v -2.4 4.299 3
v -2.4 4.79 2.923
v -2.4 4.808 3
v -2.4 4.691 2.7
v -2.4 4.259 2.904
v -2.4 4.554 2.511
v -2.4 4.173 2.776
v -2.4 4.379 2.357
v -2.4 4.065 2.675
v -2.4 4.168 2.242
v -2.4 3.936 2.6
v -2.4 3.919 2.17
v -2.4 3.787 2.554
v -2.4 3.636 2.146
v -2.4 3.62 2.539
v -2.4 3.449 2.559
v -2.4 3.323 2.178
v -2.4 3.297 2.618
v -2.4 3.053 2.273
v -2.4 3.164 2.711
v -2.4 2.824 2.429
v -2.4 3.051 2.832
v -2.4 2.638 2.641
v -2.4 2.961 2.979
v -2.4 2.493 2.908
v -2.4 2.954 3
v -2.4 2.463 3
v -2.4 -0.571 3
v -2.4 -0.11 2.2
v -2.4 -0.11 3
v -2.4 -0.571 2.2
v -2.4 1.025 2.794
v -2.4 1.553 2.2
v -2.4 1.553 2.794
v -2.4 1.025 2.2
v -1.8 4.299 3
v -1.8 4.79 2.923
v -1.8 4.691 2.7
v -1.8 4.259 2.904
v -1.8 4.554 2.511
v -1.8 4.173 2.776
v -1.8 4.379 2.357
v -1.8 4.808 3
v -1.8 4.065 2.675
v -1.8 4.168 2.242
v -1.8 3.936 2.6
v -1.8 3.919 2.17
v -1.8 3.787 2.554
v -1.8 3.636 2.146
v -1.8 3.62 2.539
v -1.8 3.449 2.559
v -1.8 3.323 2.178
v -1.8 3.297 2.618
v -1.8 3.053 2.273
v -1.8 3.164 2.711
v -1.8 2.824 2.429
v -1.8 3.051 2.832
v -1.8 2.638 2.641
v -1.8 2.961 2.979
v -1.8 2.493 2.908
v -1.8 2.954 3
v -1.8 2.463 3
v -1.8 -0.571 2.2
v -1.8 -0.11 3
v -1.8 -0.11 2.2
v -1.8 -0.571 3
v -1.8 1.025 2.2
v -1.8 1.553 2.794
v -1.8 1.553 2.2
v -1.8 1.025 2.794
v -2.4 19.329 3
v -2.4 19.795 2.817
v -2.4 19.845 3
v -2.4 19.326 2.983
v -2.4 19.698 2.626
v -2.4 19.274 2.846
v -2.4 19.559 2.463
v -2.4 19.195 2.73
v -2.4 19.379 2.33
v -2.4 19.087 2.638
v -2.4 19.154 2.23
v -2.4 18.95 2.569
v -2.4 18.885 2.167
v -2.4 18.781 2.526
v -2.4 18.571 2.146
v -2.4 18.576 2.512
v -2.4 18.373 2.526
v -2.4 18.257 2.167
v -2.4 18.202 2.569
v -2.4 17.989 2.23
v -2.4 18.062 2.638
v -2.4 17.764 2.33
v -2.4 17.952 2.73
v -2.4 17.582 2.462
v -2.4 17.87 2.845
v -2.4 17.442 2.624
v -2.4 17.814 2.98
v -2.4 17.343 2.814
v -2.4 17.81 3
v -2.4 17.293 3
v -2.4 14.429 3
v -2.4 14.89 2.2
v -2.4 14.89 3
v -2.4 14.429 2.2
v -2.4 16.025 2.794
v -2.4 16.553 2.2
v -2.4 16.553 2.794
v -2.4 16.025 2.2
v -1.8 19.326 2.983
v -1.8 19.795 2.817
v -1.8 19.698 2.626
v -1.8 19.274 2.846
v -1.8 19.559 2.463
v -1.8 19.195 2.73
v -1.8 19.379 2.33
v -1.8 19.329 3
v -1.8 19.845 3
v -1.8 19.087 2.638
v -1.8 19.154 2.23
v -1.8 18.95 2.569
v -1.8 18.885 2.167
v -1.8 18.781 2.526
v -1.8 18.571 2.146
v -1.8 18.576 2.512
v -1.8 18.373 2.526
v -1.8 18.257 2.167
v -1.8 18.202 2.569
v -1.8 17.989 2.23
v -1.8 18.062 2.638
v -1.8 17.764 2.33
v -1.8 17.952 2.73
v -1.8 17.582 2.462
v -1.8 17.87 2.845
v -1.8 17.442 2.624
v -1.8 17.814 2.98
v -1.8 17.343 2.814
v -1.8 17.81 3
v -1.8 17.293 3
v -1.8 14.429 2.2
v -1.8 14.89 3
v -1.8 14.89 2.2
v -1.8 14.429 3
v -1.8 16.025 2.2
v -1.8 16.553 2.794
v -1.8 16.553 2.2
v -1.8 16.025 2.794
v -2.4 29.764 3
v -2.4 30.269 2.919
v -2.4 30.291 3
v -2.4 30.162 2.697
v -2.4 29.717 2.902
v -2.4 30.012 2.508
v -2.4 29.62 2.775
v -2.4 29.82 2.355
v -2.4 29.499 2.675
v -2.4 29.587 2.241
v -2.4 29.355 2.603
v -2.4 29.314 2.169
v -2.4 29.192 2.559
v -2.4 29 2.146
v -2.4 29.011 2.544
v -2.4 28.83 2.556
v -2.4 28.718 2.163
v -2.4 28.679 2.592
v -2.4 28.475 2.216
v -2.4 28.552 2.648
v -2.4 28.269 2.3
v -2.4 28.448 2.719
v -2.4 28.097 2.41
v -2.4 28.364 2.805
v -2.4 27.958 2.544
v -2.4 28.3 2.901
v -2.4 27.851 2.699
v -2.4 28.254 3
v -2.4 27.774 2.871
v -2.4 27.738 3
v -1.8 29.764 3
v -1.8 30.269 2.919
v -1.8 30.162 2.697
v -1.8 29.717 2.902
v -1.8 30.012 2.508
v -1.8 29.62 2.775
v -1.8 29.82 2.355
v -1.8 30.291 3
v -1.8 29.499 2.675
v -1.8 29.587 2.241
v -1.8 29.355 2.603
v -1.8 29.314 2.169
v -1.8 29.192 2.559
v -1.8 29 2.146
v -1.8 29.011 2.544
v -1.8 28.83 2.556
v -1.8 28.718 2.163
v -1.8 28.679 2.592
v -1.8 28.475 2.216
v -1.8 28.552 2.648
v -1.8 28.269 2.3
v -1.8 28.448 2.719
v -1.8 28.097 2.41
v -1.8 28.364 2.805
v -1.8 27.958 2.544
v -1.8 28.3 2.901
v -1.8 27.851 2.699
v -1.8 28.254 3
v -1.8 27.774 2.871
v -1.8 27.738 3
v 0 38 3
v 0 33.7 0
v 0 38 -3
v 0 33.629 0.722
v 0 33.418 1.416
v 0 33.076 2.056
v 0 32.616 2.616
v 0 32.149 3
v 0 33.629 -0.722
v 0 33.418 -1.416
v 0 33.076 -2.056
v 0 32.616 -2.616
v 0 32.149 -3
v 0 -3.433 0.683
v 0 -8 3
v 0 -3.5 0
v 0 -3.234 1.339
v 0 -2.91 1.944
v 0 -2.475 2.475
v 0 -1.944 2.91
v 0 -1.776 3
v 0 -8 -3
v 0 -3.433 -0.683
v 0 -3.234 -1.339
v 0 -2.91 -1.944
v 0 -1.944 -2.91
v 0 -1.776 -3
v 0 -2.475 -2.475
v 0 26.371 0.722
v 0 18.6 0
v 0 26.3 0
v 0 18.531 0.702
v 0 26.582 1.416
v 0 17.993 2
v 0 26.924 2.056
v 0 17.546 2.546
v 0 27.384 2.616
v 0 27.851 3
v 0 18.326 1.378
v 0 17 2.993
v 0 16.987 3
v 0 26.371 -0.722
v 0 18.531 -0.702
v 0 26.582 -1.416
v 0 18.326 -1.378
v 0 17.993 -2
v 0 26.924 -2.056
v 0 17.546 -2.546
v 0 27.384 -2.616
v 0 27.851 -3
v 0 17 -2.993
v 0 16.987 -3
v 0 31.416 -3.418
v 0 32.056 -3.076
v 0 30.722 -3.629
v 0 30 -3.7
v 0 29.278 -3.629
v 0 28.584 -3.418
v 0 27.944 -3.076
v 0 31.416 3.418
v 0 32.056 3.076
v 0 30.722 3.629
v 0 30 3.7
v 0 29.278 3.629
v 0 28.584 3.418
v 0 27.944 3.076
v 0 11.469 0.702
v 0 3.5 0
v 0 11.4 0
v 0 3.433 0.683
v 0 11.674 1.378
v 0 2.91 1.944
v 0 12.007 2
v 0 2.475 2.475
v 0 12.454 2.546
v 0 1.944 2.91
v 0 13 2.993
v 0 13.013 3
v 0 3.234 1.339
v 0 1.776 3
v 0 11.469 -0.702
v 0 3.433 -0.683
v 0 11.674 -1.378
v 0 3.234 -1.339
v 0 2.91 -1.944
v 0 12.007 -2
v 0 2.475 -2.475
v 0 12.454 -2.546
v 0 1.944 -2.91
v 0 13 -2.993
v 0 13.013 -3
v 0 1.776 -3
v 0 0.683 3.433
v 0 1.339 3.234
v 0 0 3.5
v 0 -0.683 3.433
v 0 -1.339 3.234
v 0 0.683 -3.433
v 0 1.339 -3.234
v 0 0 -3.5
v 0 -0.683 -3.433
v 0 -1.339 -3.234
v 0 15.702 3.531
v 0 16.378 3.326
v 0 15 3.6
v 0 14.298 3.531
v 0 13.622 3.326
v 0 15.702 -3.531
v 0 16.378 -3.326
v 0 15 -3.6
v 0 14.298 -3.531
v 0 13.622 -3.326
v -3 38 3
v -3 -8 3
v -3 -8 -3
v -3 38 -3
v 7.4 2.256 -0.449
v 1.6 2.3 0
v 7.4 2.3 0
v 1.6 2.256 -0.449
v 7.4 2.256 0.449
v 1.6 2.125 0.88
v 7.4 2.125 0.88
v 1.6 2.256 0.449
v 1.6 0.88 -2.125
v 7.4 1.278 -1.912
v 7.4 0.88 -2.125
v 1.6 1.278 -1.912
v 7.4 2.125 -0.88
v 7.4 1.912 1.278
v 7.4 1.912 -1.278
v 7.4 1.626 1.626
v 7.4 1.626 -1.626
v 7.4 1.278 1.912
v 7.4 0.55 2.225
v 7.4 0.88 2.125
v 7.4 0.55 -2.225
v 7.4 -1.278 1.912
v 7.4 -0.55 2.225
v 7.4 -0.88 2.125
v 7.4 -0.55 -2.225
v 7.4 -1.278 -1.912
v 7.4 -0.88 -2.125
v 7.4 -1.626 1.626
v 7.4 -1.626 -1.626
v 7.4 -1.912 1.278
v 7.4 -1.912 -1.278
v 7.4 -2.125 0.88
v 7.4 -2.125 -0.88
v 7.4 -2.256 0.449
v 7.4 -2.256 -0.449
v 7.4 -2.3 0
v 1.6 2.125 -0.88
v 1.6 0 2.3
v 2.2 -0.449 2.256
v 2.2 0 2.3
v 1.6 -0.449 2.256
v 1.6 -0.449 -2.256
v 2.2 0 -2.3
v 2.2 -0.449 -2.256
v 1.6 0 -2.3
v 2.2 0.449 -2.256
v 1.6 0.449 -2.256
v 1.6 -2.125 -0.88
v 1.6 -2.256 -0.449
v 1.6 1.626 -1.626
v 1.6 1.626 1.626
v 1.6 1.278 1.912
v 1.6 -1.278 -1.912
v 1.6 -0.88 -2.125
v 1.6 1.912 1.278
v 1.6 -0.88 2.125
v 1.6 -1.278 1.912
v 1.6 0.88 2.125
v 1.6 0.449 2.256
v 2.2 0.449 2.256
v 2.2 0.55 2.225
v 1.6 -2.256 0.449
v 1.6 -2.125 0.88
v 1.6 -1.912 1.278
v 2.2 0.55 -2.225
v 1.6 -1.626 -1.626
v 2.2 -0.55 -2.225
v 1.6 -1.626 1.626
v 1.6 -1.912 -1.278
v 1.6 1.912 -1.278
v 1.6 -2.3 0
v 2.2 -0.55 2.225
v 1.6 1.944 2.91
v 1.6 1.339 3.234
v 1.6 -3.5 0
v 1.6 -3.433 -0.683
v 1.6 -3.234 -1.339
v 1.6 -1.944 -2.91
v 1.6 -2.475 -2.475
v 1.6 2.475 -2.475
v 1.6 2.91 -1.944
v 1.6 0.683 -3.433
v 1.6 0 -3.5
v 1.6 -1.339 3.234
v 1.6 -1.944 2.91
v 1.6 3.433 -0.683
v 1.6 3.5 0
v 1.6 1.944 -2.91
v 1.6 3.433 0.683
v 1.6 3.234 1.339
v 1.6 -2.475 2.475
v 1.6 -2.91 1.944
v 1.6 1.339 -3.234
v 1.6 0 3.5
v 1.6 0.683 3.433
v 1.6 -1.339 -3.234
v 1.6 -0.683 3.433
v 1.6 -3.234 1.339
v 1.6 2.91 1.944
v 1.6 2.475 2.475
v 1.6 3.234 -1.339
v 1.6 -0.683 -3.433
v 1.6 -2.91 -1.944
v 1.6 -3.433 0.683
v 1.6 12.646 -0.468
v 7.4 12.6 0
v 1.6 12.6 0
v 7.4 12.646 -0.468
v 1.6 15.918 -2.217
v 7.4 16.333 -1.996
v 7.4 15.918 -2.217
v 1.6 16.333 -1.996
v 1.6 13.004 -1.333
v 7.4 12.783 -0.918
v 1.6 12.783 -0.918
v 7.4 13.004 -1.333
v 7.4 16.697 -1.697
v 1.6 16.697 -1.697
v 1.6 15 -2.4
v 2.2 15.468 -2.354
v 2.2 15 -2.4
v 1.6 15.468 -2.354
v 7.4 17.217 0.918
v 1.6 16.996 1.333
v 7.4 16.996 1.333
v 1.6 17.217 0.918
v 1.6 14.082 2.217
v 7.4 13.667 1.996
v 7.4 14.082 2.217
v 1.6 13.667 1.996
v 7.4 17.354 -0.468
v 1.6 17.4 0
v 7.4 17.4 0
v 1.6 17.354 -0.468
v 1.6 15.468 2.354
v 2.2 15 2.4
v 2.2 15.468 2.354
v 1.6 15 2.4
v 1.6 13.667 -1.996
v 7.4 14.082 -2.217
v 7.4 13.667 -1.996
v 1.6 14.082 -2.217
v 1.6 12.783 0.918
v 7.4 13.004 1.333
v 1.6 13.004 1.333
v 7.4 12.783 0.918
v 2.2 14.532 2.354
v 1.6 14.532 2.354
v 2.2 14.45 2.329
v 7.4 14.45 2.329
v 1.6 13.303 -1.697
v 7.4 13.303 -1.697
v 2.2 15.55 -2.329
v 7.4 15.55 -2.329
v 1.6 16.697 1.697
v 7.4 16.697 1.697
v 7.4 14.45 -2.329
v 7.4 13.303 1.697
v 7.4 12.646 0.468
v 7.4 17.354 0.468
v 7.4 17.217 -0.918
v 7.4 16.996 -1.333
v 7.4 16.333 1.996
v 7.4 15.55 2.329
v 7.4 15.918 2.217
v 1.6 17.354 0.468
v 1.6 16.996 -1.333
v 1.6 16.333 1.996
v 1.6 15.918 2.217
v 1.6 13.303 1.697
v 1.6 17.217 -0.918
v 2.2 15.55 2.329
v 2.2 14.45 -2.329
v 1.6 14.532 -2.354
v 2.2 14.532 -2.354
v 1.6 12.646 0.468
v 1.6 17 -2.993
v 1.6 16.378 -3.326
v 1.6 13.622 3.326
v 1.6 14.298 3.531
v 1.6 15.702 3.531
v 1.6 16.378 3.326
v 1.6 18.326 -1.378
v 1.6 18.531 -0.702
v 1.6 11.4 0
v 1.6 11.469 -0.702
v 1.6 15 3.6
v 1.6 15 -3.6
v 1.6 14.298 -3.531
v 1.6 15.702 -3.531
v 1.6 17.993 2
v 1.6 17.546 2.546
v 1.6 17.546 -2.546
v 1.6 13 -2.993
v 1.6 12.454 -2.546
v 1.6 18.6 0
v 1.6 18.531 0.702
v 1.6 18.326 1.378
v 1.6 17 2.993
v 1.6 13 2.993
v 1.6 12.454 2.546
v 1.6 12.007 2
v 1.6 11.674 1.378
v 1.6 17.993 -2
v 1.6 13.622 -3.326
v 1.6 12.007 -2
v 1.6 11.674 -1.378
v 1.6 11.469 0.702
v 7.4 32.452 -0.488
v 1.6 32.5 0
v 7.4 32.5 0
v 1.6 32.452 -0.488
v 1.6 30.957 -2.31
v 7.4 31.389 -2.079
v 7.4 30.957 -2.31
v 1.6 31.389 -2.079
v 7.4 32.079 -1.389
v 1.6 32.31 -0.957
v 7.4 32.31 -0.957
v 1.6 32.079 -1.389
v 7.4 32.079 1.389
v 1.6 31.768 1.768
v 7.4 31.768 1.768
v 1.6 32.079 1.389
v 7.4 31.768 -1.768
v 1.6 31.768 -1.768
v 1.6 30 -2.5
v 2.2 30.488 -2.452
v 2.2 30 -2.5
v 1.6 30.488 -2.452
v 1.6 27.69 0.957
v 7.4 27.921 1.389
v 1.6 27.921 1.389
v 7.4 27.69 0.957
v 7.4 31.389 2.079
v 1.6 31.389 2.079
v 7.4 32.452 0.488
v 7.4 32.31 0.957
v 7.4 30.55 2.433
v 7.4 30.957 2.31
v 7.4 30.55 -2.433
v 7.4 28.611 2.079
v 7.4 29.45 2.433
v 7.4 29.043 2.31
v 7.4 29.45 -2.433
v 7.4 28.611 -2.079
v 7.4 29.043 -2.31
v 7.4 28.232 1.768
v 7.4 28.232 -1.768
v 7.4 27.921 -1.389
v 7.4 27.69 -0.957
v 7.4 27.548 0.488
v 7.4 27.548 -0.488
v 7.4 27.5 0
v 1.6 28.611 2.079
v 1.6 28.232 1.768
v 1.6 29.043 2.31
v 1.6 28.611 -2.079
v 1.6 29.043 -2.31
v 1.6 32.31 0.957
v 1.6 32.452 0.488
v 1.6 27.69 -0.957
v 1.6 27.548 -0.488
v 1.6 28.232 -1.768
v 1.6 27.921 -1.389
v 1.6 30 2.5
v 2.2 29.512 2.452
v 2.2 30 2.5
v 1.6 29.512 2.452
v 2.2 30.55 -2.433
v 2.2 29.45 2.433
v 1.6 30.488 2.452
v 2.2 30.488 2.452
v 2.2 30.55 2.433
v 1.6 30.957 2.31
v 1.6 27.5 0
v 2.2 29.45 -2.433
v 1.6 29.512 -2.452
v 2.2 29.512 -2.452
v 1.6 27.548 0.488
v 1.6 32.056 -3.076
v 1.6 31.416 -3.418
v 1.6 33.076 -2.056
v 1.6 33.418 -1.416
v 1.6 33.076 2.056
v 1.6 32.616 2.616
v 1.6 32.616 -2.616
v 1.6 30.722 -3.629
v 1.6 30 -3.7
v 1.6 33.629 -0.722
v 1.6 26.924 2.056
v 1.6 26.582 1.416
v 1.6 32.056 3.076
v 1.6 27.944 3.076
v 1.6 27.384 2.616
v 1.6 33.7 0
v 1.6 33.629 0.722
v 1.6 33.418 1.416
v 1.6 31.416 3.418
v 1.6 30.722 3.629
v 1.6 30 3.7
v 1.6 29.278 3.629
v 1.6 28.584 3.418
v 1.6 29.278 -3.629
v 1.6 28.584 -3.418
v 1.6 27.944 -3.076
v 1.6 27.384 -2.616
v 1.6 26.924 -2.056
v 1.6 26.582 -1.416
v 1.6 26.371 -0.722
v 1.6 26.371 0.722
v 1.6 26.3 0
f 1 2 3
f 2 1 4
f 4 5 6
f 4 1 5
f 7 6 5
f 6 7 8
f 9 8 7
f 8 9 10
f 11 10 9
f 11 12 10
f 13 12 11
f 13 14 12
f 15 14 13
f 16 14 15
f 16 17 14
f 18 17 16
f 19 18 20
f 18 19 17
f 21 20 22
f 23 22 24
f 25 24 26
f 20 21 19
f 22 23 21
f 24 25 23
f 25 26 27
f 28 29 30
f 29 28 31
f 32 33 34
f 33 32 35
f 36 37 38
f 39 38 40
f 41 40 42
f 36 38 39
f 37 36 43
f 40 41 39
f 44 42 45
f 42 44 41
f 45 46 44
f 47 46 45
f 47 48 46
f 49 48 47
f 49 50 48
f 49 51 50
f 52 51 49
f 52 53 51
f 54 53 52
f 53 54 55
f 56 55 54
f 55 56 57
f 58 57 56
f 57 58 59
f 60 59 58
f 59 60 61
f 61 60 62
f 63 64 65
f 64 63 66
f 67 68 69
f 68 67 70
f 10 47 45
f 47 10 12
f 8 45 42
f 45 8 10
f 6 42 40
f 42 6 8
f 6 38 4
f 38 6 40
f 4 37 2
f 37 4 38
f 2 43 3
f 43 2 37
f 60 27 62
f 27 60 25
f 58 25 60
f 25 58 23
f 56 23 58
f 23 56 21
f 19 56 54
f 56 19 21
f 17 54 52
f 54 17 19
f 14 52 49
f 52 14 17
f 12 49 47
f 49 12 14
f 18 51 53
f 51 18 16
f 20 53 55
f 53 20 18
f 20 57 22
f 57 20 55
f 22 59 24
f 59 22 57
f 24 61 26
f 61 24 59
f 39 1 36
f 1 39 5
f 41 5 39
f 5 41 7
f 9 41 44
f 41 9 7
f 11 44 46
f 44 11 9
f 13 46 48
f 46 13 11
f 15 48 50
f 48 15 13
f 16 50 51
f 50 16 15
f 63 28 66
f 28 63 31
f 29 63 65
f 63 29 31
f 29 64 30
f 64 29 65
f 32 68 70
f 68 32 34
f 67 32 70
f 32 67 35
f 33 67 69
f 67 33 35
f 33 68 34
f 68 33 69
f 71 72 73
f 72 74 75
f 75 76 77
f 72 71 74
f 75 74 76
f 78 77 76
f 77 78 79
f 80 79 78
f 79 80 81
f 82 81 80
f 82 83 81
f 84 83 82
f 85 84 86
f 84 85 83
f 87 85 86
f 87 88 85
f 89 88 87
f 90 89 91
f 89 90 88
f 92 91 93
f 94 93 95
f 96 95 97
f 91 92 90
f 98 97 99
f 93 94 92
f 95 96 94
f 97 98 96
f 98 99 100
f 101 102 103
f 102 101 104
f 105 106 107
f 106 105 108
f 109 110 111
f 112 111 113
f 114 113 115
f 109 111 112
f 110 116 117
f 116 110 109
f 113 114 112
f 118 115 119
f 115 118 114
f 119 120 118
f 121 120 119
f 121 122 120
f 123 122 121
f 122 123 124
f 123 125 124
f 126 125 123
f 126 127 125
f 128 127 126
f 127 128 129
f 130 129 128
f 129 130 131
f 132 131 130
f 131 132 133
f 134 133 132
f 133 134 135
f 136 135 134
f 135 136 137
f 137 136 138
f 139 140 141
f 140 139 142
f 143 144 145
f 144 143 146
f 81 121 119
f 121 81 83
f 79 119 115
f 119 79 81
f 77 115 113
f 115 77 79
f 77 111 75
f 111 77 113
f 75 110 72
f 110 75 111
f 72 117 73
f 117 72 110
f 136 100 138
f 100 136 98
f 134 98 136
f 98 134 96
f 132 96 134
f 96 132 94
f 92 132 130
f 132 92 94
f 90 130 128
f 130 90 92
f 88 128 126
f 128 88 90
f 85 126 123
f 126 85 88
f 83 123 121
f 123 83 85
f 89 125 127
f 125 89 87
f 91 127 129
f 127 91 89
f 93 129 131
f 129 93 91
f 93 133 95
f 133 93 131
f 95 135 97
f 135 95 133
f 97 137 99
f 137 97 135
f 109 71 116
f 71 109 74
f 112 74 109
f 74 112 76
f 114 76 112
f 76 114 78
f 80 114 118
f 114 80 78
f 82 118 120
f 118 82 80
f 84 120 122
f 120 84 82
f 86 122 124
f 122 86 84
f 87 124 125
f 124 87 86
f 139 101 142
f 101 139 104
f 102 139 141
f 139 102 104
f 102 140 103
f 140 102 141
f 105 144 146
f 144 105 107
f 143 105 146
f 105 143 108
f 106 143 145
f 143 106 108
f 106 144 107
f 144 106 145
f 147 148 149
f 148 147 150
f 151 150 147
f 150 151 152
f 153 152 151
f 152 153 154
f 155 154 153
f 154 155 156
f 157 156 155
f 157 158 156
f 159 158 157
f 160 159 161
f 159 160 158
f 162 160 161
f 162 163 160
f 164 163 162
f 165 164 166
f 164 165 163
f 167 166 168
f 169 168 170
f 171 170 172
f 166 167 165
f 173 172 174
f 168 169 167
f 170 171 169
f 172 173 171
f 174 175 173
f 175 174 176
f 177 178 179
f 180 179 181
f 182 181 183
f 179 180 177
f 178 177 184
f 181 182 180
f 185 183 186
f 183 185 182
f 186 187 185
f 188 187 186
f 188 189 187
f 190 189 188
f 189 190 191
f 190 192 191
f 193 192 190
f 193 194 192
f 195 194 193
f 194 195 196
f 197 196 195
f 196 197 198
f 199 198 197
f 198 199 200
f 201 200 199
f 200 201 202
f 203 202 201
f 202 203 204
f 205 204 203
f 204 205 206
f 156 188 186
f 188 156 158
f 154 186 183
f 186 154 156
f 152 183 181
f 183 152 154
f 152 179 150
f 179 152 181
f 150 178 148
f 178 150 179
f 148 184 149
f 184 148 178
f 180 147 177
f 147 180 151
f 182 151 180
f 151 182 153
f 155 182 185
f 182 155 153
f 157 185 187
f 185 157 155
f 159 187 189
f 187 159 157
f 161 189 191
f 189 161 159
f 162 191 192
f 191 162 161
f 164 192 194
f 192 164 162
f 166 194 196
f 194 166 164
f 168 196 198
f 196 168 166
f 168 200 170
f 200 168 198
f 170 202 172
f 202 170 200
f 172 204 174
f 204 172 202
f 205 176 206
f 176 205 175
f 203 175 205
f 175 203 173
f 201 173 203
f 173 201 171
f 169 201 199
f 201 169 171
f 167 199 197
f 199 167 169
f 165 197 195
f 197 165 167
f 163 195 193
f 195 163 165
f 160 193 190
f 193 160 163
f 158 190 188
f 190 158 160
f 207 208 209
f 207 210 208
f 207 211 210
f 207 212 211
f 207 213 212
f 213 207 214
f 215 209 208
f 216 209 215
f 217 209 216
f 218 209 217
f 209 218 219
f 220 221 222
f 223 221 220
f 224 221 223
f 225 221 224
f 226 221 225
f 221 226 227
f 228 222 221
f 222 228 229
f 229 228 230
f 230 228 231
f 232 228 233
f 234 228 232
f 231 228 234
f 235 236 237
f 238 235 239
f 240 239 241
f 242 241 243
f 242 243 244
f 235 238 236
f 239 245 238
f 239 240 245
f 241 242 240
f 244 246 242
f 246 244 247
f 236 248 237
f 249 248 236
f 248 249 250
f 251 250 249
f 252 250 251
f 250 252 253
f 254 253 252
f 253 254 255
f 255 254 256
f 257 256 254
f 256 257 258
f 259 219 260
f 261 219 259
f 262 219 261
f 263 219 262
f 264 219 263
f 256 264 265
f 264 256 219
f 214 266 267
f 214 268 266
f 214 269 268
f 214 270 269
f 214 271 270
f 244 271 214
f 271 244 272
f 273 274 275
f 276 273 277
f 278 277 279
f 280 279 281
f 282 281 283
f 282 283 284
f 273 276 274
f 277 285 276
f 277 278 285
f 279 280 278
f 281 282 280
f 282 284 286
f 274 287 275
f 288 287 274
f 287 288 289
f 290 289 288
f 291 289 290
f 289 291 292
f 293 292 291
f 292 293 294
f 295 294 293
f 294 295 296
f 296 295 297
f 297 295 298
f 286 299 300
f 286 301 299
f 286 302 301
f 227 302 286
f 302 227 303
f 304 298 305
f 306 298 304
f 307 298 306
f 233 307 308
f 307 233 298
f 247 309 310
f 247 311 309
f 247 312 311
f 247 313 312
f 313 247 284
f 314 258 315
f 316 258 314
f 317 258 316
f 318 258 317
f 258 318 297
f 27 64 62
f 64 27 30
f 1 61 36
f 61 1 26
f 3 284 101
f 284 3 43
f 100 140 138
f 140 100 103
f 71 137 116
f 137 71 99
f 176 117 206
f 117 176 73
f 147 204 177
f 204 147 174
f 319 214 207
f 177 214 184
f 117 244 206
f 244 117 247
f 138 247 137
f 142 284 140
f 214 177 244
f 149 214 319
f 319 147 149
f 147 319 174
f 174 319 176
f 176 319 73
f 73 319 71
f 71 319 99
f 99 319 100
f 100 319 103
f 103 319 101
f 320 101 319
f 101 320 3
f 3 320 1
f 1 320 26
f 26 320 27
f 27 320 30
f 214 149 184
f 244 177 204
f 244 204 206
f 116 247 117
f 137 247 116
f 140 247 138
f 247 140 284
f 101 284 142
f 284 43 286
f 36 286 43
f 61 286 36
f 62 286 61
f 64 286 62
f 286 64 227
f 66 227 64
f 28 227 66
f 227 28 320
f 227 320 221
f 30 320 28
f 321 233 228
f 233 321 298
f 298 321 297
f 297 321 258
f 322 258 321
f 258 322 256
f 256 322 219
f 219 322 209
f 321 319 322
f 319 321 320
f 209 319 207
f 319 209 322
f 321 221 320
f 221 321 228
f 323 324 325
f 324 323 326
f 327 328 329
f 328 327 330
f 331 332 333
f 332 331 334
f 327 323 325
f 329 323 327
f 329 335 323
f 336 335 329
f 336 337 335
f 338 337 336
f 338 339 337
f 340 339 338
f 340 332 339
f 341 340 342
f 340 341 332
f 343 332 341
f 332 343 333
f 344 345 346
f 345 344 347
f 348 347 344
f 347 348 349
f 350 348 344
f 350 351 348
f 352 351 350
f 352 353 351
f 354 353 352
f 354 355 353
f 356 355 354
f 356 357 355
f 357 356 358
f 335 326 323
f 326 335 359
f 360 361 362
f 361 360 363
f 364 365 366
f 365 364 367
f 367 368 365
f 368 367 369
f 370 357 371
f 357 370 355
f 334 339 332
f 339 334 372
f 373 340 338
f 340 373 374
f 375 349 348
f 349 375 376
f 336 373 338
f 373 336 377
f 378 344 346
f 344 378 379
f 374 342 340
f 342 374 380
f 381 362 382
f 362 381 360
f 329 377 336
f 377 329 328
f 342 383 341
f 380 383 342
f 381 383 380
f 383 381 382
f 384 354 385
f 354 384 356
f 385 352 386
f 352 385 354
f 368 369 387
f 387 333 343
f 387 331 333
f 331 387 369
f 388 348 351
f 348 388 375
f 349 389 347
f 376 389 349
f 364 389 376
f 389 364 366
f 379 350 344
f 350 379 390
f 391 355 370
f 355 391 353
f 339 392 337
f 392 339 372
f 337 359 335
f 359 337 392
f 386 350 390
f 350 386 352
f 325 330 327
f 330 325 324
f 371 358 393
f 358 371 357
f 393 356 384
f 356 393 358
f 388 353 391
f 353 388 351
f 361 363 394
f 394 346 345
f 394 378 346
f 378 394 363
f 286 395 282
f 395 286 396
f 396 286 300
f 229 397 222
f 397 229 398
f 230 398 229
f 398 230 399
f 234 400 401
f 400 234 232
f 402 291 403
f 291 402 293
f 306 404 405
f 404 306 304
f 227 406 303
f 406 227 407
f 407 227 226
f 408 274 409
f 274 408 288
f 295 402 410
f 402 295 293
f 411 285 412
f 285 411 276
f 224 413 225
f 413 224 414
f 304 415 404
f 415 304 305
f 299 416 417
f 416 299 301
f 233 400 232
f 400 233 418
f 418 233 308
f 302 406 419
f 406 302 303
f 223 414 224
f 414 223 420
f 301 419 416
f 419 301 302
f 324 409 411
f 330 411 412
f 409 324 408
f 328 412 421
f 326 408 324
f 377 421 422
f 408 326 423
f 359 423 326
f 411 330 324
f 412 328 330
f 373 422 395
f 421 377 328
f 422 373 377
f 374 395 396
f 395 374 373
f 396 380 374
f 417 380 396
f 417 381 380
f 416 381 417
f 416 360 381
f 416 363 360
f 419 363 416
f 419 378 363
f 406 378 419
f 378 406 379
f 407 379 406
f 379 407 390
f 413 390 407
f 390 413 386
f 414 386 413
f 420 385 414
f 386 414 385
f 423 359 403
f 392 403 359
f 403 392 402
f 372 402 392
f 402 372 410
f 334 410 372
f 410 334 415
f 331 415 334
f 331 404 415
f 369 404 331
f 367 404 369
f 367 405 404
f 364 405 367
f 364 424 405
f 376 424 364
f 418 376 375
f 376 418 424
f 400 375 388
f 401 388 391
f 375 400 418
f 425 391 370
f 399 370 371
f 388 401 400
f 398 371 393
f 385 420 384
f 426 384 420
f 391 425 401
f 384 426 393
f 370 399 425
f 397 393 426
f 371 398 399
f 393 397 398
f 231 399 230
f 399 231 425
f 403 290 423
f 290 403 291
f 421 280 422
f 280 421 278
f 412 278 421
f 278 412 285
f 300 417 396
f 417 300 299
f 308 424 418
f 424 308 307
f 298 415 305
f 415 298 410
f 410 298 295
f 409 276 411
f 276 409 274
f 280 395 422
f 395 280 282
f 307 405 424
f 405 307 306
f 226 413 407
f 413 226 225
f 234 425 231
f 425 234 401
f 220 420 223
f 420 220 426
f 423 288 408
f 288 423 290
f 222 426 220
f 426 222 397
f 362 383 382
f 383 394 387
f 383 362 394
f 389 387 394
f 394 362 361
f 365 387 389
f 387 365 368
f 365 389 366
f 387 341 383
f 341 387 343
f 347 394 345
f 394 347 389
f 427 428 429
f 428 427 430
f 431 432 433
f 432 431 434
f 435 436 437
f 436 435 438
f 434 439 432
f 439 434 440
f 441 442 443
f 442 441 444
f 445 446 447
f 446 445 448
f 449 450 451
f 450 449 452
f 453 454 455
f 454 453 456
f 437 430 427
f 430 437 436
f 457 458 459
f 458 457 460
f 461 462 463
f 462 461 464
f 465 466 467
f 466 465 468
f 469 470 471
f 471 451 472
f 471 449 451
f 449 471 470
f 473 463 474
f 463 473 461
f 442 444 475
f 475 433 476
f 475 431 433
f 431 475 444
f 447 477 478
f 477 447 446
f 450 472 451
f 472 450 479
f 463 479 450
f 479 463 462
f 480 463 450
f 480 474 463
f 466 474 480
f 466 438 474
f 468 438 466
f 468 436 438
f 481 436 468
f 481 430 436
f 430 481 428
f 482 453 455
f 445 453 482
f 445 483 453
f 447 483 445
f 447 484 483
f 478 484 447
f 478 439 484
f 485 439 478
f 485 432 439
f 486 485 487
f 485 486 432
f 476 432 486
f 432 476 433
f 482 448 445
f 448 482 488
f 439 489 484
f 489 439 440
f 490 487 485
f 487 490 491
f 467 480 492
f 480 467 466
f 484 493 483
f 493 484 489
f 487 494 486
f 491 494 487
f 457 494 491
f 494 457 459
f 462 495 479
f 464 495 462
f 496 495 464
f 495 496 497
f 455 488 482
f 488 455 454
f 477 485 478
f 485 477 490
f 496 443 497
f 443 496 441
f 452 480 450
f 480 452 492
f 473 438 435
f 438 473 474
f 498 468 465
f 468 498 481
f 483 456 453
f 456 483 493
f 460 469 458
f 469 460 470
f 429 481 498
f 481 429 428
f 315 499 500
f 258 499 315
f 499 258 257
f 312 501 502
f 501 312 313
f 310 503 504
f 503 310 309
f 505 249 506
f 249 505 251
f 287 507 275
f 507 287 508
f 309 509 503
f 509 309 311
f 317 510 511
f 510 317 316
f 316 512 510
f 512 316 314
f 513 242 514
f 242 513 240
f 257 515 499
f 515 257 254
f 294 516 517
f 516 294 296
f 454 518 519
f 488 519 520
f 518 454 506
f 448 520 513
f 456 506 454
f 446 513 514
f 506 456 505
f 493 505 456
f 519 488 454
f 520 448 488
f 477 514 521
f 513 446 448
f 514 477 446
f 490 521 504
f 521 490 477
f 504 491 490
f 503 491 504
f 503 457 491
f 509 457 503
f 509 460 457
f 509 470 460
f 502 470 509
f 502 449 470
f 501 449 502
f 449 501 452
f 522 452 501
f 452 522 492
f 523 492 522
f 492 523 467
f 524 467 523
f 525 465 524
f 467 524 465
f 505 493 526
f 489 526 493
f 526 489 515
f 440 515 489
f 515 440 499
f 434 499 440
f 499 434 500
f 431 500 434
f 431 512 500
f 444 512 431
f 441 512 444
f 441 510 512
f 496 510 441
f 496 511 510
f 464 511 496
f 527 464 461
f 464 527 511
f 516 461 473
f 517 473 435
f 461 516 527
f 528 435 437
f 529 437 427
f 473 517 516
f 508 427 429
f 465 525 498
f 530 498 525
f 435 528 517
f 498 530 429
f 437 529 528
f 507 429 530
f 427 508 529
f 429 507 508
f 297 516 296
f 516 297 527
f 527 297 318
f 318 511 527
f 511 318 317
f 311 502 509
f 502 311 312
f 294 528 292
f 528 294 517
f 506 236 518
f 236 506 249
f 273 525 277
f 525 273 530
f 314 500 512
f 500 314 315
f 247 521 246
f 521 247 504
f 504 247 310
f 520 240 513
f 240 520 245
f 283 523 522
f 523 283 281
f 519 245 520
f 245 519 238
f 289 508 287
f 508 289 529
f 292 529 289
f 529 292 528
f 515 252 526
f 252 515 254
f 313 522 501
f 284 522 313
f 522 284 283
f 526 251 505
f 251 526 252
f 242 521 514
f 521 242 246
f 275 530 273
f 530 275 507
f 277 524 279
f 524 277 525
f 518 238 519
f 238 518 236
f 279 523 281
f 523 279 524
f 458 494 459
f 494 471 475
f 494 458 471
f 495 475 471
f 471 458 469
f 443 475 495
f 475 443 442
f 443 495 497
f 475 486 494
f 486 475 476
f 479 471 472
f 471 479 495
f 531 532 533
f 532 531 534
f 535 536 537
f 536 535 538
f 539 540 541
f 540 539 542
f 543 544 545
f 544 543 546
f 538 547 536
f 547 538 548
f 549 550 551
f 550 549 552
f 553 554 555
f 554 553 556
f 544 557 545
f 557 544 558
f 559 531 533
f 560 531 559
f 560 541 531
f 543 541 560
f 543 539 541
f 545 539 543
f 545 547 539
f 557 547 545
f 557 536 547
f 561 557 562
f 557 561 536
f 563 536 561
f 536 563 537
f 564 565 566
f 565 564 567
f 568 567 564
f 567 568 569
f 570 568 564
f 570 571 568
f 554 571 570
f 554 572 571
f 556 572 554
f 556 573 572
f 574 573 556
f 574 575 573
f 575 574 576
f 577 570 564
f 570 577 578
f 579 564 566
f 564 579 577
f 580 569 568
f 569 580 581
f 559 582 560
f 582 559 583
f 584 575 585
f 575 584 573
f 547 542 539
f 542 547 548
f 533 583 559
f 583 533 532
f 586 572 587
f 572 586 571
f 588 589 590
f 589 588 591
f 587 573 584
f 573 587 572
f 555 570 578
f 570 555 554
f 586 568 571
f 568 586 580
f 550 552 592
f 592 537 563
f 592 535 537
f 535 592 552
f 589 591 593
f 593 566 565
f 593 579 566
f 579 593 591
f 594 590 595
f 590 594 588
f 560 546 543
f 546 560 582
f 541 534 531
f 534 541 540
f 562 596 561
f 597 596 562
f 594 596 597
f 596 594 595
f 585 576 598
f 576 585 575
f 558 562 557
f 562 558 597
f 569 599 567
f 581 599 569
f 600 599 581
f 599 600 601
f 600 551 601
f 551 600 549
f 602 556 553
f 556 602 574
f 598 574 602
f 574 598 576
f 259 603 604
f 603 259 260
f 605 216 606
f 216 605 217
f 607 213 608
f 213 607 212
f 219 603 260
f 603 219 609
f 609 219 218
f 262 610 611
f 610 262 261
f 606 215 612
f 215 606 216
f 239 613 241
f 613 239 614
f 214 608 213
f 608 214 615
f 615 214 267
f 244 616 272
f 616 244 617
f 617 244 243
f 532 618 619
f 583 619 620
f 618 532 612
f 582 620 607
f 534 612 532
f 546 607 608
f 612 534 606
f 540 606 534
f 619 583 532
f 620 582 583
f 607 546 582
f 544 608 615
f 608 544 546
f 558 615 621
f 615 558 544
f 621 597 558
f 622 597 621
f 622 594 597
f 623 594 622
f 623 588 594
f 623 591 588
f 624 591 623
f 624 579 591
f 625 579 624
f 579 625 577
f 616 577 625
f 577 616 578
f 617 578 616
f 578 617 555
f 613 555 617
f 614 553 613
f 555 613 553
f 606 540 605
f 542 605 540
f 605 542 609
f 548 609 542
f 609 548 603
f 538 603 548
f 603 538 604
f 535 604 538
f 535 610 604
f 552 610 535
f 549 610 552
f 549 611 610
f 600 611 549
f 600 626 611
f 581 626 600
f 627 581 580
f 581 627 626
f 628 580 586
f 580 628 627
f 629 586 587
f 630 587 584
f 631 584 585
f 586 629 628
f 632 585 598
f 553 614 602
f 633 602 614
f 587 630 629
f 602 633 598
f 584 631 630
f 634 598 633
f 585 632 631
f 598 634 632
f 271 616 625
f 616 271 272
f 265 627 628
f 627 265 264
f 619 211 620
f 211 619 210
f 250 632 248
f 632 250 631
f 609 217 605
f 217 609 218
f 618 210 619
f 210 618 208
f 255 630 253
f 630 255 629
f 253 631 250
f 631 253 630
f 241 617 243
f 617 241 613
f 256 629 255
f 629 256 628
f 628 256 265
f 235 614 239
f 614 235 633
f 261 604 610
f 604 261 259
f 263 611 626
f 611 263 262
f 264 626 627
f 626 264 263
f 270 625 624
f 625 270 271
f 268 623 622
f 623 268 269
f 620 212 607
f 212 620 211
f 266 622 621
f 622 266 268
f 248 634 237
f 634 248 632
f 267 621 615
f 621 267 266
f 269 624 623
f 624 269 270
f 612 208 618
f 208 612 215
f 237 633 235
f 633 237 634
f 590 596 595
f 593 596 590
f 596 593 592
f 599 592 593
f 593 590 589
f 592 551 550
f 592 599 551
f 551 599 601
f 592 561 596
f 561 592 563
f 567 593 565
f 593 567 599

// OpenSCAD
// accessories/lego_side.scad (7/23)
// K151 body side LEGO(Technic)-compatible holes -> tiny event accessories.
// All parts print LYING FLAT (pin axis in the bed plane -> strong layers).
//   PART = "pintest"  : 3 pins (4.6/4.8/5.0) on a handle plate - fit test first!
//   PART = "flag"     : pin + pole + flag plate embossed "LT!"
//   PART = "penlight" : pin + short glow-stick shape (print in a bright colour)
// Technic hole nominal: 4.8. Pick the pin dia that snaps in from the test.

PIN_D   = 4.8;         // chosen after the pintest
pin_len = 7.4;         // Technic hole depth ~7.8
slit_w  = 1.1;         // flex slit

module pin(d) {
    difference() {
        union() {
            rotate([0, 90, 0]) cylinder(d = d, h = pin_len, $fn = 32);
            // small stop collar
            rotate([0, 90, 0]) cylinder(d = d + 2.4, h = 1.6, $fn = 32);
        }
        // flex slit through the pin tip
        translate([2.2, -slit_w/2, -d]) cube([pin_len, slit_w, d * 2]);
    }
}

module pintest() {
    // handle plate with three test pins, dia labels embossed
    dias = [4.6, 4.8, 5.0];
    difference() {
        translate([-3, -8, -3]) cube([3, 46, 6]);
        for (i = [0 : 2])
            translate([-2.4, i * 15 - 2.5, 2.2])
                rotate([90, 0, 90]) linear_extrude(0.6)
                    text(str(dias[i]), size = 4, halign = "left");
    }
    for (i = [0 : 2]) translate([0, i * 15, 0]) pin(dias[i]);
}

module flag() {
    pin(PIN_D);
    // pole continuing from the collar
    rotate([0, -90, 0]) cylinder(d = 4, h = 38, $fn = 24);
    // flag plate in the pin-axis plane -> vertical when mounted
    translate([-38, -1.5, 0]) {
        difference() {
            translate([0, 0, -11]) cube([30, 1.6, 22]);
            translate([3.5, 1.61, -8]) rotate([90, 0, 0])
                linear_extrude(0.7) text("LT!", size = 12, halign = "left");
        }
    }
}

module penlight() {
    pin(PIN_D);
    // stick with a rounded tip (hull of cylinder + sphere), lying flat
    hull() {
        rotate([0, -90, 0]) cylinder(d = 6, h = 26, $fn = 32);
        translate([-28, 0, 0]) sphere(d = 6, $fn = 32);
    }
}

PART = "pintest";
if (PART == "flag")          flag();
else if (PART == "penlight") penlight();
else                         pintest();
